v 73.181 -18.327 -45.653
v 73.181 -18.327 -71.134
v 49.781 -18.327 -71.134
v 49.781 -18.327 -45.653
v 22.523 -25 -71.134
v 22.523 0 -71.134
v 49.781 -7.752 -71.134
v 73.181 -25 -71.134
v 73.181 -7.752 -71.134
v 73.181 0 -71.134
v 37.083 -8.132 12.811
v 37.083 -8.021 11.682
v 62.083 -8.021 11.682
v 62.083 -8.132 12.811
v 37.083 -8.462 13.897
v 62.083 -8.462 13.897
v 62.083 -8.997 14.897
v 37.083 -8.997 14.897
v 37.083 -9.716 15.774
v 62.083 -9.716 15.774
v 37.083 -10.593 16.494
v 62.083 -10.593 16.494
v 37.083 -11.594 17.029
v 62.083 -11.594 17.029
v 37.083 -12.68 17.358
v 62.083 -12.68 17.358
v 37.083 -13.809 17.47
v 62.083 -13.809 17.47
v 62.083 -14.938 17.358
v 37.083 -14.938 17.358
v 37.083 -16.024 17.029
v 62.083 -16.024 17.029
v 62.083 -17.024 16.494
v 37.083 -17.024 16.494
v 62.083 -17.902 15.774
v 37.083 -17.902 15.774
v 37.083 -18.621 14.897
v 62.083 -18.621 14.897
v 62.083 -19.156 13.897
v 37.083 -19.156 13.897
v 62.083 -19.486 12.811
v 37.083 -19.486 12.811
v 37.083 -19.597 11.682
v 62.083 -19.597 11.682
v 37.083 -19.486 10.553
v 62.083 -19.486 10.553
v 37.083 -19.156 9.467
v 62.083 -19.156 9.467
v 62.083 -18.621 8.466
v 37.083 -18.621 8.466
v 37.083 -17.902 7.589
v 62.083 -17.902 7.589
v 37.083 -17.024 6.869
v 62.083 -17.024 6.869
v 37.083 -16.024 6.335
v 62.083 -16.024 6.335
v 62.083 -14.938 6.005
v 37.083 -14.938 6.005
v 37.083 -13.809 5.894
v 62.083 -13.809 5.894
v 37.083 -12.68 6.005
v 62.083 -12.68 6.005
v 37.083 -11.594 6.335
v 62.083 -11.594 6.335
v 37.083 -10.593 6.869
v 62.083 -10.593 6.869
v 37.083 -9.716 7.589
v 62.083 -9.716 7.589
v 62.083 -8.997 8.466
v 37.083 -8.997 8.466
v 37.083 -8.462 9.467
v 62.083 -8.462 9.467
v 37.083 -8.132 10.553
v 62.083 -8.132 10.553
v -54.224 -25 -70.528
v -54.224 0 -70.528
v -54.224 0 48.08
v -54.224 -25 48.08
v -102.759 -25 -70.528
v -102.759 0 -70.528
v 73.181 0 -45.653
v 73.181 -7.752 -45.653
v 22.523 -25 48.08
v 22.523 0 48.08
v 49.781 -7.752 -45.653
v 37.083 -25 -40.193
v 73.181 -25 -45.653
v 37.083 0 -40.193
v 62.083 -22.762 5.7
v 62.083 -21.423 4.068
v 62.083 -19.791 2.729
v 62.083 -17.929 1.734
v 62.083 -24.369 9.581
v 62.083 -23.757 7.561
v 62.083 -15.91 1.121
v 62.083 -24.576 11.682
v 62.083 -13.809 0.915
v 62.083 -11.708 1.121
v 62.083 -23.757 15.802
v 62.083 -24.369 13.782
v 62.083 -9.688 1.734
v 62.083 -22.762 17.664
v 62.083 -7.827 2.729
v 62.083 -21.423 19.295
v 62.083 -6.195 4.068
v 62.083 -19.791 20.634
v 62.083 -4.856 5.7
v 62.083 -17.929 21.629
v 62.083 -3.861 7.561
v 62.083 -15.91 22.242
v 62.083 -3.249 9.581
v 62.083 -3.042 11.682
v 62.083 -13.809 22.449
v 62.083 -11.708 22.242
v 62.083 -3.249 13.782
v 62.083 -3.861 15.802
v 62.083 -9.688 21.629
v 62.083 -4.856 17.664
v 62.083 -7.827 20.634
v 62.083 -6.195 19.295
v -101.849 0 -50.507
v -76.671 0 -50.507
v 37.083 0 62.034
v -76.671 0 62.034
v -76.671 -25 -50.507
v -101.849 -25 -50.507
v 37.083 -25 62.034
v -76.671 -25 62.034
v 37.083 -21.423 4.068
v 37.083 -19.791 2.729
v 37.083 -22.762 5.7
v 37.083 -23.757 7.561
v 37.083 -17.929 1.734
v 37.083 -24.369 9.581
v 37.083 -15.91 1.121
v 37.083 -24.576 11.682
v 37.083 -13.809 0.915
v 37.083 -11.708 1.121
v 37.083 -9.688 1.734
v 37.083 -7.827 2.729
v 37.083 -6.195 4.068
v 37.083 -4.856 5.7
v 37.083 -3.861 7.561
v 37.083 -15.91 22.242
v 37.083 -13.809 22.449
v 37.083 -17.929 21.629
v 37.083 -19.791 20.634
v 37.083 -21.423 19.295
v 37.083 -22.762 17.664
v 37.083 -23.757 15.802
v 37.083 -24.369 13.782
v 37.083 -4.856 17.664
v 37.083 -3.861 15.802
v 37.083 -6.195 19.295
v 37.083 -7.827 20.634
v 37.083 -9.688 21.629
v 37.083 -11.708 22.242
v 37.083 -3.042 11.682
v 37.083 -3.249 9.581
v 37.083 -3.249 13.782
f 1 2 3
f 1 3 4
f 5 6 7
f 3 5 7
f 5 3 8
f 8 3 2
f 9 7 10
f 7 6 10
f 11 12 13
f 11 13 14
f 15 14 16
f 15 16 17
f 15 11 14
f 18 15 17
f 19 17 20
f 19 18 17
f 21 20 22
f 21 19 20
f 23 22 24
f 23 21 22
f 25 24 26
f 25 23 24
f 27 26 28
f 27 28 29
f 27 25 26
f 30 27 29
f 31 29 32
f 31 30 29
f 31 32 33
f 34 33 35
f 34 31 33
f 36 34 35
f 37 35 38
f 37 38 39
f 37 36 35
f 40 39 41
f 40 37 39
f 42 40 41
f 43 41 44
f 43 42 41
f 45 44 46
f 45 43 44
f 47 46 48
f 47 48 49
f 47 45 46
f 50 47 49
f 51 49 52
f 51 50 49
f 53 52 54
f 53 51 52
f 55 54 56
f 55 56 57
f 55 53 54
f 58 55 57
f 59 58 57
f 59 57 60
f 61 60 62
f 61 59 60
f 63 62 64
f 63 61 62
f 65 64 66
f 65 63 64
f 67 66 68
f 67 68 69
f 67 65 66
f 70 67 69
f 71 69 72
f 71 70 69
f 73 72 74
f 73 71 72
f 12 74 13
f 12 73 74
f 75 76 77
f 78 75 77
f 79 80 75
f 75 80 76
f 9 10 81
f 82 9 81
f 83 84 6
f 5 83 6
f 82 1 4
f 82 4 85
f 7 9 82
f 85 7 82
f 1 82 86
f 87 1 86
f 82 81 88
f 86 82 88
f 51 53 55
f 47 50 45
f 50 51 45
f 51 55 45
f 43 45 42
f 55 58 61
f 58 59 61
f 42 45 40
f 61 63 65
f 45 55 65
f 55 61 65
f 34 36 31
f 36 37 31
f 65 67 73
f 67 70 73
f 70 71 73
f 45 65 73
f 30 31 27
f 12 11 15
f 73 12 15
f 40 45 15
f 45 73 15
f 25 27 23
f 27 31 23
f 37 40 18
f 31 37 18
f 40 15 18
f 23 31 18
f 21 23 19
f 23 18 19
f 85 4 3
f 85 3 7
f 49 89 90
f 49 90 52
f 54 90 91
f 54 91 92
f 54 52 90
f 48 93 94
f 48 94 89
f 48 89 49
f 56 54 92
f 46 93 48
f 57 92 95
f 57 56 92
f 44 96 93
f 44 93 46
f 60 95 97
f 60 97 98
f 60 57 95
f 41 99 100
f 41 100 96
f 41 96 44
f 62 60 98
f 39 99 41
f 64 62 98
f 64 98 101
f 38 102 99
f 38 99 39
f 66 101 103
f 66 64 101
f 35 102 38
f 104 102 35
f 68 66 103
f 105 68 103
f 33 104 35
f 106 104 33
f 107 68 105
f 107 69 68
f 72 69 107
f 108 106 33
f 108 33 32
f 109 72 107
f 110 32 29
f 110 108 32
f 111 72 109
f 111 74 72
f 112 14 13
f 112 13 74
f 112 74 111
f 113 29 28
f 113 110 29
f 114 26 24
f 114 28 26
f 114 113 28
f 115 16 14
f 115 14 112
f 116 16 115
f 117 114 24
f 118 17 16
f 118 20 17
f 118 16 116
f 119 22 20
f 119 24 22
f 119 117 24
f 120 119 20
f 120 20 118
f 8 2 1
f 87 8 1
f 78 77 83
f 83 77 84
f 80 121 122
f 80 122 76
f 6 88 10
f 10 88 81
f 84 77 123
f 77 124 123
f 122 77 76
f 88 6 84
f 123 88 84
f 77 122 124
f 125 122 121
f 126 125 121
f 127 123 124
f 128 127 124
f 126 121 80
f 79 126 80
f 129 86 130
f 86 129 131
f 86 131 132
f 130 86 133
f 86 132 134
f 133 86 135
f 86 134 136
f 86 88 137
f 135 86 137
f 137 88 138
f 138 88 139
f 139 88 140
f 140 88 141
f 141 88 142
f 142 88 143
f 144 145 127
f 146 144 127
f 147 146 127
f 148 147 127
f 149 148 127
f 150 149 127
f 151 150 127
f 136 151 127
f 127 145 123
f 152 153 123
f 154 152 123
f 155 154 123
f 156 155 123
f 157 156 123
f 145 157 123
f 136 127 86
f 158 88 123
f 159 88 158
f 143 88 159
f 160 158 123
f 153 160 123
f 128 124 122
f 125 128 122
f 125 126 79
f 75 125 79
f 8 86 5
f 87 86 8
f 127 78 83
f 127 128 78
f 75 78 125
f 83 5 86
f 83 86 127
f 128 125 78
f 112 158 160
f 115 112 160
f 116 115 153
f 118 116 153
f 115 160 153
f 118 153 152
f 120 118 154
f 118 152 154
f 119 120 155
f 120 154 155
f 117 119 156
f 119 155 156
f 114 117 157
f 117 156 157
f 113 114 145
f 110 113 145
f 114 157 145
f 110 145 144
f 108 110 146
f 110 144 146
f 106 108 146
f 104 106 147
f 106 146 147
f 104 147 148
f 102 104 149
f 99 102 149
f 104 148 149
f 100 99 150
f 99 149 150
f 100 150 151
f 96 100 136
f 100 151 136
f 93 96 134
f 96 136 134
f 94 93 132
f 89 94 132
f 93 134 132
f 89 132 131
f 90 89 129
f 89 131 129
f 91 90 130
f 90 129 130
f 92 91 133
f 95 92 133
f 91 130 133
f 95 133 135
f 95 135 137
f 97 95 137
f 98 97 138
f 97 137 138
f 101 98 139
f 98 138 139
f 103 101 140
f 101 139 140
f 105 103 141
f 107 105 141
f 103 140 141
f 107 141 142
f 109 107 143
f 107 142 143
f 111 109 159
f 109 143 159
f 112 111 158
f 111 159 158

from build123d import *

# Parameters (mm, degrees)
F1_DEPTH = 25
F2_W     = 10.574922
F2_H     = 25.480952
F3_DEPTH = 23.4
F4_R     = 10.767278
F4_R_2   = 5.787824
F5_DEPTH = 25


with BuildPart() as f1:
    # F0 (on Front) → F1 (new body)
    with BuildSketch(Plane.XZ):
        Polygon((-76.671138, -50.506882), (-101.848751, -50.506882), (-102.75878, -70.527636), (-54.223638, -70.527636), (-54.223638, 48.080128), (22.522558, 48.080128), (22.522558, -71.134321), (73.181108, -71.134321), (73.181108, -45.653369), (37.083104, -40.193167), (37.083104, 62.033977), (-76.671138, 62.033977), align=None)
    extrude(amount=F1_DEPTH)

    # F2 (on face) → F3 (cut)
    with BuildSketch(Plane.YZ.offset(73.181108)):
        with Locations((-13.039805, -58.393845)):
            Rectangle(F2_W, F2_H)
    extrude(amount=-F3_DEPTH, mode=Mode.SUBTRACT)

    # F4 (on face) → F5 (join)
    with BuildSketch(Plane.YZ.offset(37.083104)):
        with Locations((-13.808914, 11.681821)):
            Circle(F4_R)
        with Locations((-13.808914, 11.681821)):
            Circle(F4_R_2, mode=Mode.SUBTRACT)
    extrude(amount=F5_DEPTH)


solid = f1.part
